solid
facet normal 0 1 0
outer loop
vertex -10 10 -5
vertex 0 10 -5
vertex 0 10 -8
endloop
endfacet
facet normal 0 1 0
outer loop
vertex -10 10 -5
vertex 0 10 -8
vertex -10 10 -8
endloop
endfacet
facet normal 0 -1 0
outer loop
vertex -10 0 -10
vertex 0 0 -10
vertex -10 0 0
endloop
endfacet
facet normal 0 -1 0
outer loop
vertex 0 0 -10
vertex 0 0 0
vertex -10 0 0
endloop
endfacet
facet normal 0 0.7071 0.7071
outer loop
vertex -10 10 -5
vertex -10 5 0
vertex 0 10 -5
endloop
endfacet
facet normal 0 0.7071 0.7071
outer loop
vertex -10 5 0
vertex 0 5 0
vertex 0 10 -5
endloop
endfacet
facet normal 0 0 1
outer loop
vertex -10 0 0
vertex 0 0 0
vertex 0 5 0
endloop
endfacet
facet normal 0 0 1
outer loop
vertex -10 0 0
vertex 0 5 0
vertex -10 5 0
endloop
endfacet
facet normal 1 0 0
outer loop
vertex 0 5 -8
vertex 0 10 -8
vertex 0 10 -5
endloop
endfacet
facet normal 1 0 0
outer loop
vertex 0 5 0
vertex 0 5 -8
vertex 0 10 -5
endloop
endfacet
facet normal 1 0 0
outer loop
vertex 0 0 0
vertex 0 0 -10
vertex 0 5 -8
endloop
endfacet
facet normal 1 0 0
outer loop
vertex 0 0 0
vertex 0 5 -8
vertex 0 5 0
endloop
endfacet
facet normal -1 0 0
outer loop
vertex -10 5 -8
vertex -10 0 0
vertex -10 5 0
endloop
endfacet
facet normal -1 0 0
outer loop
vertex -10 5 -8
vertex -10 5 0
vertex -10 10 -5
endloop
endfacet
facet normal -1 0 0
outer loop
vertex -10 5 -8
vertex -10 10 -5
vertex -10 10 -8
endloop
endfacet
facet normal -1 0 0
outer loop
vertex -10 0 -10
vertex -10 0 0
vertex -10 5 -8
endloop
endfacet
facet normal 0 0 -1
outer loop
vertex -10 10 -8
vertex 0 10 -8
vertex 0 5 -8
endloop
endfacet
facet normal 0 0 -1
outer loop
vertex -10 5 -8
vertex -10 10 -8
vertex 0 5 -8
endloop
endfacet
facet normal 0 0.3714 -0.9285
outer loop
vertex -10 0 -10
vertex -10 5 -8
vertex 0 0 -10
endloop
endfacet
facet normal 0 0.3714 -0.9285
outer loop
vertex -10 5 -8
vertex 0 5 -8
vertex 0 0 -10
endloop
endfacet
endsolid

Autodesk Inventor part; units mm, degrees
ref_plane "YZ Plane" through (0, 0, 0) normal (1, 0, 0) x (0, 1, 0)
ref_plane "XZ Plane" through (0, 0, 0) normal (0, 1, 0) x (-1, 0, 0)
ref_plane "XY Plane" through (0, 0, 0) normal (0, 0, 1) x (1, 0, 0)
sketch "Sketch1" plane through (0, 0, 0) normal (0, 1, 0) x (-1, 0, 0)
  line L0 (0, 0) -> (10, 0)
  line L1 (10, 0) -> (10, -10)
  line L2 (10, -10) -> (0, -10)
  line L3 (0, -10) -> (0, 0)
  dimension "d0" = 10
  dimension "d1" = 10
extrude "Extrusion1" add sketch "Sketch1" along normal blind 10
sketch "Sketch2" plane through (0, 0, 0) normal (1, 0, 0) x (0, 0, -1)
  line L0 (0, 10) -> (10, 10) projected
  line L1 (0, 0) -> (0, 10) projected
  line L2 (0, 5) -> (5, 10)
  line L3 (0, 10) -> (0, 5)
extrude "Extrusion2" cut sketch "Sketch2" against normal blind 10
sketch "Sketch3" plane through (0, 0, 0) normal (1, 0, 0) x (0, 0, -1)
  line L0 (10, 0) -> (10, 10) projected
  line L1 (5, 10) -> (10, 10) projected
  line L2 (8, 10) -> (8, 5)
  line L3 (8, 5) -> (10, 0)
  line L4 (10, 10) -> (8, 10)
extrude "Extrusion3" cut sketch "Sketch3" against normal blind 10
properties part number "141"
